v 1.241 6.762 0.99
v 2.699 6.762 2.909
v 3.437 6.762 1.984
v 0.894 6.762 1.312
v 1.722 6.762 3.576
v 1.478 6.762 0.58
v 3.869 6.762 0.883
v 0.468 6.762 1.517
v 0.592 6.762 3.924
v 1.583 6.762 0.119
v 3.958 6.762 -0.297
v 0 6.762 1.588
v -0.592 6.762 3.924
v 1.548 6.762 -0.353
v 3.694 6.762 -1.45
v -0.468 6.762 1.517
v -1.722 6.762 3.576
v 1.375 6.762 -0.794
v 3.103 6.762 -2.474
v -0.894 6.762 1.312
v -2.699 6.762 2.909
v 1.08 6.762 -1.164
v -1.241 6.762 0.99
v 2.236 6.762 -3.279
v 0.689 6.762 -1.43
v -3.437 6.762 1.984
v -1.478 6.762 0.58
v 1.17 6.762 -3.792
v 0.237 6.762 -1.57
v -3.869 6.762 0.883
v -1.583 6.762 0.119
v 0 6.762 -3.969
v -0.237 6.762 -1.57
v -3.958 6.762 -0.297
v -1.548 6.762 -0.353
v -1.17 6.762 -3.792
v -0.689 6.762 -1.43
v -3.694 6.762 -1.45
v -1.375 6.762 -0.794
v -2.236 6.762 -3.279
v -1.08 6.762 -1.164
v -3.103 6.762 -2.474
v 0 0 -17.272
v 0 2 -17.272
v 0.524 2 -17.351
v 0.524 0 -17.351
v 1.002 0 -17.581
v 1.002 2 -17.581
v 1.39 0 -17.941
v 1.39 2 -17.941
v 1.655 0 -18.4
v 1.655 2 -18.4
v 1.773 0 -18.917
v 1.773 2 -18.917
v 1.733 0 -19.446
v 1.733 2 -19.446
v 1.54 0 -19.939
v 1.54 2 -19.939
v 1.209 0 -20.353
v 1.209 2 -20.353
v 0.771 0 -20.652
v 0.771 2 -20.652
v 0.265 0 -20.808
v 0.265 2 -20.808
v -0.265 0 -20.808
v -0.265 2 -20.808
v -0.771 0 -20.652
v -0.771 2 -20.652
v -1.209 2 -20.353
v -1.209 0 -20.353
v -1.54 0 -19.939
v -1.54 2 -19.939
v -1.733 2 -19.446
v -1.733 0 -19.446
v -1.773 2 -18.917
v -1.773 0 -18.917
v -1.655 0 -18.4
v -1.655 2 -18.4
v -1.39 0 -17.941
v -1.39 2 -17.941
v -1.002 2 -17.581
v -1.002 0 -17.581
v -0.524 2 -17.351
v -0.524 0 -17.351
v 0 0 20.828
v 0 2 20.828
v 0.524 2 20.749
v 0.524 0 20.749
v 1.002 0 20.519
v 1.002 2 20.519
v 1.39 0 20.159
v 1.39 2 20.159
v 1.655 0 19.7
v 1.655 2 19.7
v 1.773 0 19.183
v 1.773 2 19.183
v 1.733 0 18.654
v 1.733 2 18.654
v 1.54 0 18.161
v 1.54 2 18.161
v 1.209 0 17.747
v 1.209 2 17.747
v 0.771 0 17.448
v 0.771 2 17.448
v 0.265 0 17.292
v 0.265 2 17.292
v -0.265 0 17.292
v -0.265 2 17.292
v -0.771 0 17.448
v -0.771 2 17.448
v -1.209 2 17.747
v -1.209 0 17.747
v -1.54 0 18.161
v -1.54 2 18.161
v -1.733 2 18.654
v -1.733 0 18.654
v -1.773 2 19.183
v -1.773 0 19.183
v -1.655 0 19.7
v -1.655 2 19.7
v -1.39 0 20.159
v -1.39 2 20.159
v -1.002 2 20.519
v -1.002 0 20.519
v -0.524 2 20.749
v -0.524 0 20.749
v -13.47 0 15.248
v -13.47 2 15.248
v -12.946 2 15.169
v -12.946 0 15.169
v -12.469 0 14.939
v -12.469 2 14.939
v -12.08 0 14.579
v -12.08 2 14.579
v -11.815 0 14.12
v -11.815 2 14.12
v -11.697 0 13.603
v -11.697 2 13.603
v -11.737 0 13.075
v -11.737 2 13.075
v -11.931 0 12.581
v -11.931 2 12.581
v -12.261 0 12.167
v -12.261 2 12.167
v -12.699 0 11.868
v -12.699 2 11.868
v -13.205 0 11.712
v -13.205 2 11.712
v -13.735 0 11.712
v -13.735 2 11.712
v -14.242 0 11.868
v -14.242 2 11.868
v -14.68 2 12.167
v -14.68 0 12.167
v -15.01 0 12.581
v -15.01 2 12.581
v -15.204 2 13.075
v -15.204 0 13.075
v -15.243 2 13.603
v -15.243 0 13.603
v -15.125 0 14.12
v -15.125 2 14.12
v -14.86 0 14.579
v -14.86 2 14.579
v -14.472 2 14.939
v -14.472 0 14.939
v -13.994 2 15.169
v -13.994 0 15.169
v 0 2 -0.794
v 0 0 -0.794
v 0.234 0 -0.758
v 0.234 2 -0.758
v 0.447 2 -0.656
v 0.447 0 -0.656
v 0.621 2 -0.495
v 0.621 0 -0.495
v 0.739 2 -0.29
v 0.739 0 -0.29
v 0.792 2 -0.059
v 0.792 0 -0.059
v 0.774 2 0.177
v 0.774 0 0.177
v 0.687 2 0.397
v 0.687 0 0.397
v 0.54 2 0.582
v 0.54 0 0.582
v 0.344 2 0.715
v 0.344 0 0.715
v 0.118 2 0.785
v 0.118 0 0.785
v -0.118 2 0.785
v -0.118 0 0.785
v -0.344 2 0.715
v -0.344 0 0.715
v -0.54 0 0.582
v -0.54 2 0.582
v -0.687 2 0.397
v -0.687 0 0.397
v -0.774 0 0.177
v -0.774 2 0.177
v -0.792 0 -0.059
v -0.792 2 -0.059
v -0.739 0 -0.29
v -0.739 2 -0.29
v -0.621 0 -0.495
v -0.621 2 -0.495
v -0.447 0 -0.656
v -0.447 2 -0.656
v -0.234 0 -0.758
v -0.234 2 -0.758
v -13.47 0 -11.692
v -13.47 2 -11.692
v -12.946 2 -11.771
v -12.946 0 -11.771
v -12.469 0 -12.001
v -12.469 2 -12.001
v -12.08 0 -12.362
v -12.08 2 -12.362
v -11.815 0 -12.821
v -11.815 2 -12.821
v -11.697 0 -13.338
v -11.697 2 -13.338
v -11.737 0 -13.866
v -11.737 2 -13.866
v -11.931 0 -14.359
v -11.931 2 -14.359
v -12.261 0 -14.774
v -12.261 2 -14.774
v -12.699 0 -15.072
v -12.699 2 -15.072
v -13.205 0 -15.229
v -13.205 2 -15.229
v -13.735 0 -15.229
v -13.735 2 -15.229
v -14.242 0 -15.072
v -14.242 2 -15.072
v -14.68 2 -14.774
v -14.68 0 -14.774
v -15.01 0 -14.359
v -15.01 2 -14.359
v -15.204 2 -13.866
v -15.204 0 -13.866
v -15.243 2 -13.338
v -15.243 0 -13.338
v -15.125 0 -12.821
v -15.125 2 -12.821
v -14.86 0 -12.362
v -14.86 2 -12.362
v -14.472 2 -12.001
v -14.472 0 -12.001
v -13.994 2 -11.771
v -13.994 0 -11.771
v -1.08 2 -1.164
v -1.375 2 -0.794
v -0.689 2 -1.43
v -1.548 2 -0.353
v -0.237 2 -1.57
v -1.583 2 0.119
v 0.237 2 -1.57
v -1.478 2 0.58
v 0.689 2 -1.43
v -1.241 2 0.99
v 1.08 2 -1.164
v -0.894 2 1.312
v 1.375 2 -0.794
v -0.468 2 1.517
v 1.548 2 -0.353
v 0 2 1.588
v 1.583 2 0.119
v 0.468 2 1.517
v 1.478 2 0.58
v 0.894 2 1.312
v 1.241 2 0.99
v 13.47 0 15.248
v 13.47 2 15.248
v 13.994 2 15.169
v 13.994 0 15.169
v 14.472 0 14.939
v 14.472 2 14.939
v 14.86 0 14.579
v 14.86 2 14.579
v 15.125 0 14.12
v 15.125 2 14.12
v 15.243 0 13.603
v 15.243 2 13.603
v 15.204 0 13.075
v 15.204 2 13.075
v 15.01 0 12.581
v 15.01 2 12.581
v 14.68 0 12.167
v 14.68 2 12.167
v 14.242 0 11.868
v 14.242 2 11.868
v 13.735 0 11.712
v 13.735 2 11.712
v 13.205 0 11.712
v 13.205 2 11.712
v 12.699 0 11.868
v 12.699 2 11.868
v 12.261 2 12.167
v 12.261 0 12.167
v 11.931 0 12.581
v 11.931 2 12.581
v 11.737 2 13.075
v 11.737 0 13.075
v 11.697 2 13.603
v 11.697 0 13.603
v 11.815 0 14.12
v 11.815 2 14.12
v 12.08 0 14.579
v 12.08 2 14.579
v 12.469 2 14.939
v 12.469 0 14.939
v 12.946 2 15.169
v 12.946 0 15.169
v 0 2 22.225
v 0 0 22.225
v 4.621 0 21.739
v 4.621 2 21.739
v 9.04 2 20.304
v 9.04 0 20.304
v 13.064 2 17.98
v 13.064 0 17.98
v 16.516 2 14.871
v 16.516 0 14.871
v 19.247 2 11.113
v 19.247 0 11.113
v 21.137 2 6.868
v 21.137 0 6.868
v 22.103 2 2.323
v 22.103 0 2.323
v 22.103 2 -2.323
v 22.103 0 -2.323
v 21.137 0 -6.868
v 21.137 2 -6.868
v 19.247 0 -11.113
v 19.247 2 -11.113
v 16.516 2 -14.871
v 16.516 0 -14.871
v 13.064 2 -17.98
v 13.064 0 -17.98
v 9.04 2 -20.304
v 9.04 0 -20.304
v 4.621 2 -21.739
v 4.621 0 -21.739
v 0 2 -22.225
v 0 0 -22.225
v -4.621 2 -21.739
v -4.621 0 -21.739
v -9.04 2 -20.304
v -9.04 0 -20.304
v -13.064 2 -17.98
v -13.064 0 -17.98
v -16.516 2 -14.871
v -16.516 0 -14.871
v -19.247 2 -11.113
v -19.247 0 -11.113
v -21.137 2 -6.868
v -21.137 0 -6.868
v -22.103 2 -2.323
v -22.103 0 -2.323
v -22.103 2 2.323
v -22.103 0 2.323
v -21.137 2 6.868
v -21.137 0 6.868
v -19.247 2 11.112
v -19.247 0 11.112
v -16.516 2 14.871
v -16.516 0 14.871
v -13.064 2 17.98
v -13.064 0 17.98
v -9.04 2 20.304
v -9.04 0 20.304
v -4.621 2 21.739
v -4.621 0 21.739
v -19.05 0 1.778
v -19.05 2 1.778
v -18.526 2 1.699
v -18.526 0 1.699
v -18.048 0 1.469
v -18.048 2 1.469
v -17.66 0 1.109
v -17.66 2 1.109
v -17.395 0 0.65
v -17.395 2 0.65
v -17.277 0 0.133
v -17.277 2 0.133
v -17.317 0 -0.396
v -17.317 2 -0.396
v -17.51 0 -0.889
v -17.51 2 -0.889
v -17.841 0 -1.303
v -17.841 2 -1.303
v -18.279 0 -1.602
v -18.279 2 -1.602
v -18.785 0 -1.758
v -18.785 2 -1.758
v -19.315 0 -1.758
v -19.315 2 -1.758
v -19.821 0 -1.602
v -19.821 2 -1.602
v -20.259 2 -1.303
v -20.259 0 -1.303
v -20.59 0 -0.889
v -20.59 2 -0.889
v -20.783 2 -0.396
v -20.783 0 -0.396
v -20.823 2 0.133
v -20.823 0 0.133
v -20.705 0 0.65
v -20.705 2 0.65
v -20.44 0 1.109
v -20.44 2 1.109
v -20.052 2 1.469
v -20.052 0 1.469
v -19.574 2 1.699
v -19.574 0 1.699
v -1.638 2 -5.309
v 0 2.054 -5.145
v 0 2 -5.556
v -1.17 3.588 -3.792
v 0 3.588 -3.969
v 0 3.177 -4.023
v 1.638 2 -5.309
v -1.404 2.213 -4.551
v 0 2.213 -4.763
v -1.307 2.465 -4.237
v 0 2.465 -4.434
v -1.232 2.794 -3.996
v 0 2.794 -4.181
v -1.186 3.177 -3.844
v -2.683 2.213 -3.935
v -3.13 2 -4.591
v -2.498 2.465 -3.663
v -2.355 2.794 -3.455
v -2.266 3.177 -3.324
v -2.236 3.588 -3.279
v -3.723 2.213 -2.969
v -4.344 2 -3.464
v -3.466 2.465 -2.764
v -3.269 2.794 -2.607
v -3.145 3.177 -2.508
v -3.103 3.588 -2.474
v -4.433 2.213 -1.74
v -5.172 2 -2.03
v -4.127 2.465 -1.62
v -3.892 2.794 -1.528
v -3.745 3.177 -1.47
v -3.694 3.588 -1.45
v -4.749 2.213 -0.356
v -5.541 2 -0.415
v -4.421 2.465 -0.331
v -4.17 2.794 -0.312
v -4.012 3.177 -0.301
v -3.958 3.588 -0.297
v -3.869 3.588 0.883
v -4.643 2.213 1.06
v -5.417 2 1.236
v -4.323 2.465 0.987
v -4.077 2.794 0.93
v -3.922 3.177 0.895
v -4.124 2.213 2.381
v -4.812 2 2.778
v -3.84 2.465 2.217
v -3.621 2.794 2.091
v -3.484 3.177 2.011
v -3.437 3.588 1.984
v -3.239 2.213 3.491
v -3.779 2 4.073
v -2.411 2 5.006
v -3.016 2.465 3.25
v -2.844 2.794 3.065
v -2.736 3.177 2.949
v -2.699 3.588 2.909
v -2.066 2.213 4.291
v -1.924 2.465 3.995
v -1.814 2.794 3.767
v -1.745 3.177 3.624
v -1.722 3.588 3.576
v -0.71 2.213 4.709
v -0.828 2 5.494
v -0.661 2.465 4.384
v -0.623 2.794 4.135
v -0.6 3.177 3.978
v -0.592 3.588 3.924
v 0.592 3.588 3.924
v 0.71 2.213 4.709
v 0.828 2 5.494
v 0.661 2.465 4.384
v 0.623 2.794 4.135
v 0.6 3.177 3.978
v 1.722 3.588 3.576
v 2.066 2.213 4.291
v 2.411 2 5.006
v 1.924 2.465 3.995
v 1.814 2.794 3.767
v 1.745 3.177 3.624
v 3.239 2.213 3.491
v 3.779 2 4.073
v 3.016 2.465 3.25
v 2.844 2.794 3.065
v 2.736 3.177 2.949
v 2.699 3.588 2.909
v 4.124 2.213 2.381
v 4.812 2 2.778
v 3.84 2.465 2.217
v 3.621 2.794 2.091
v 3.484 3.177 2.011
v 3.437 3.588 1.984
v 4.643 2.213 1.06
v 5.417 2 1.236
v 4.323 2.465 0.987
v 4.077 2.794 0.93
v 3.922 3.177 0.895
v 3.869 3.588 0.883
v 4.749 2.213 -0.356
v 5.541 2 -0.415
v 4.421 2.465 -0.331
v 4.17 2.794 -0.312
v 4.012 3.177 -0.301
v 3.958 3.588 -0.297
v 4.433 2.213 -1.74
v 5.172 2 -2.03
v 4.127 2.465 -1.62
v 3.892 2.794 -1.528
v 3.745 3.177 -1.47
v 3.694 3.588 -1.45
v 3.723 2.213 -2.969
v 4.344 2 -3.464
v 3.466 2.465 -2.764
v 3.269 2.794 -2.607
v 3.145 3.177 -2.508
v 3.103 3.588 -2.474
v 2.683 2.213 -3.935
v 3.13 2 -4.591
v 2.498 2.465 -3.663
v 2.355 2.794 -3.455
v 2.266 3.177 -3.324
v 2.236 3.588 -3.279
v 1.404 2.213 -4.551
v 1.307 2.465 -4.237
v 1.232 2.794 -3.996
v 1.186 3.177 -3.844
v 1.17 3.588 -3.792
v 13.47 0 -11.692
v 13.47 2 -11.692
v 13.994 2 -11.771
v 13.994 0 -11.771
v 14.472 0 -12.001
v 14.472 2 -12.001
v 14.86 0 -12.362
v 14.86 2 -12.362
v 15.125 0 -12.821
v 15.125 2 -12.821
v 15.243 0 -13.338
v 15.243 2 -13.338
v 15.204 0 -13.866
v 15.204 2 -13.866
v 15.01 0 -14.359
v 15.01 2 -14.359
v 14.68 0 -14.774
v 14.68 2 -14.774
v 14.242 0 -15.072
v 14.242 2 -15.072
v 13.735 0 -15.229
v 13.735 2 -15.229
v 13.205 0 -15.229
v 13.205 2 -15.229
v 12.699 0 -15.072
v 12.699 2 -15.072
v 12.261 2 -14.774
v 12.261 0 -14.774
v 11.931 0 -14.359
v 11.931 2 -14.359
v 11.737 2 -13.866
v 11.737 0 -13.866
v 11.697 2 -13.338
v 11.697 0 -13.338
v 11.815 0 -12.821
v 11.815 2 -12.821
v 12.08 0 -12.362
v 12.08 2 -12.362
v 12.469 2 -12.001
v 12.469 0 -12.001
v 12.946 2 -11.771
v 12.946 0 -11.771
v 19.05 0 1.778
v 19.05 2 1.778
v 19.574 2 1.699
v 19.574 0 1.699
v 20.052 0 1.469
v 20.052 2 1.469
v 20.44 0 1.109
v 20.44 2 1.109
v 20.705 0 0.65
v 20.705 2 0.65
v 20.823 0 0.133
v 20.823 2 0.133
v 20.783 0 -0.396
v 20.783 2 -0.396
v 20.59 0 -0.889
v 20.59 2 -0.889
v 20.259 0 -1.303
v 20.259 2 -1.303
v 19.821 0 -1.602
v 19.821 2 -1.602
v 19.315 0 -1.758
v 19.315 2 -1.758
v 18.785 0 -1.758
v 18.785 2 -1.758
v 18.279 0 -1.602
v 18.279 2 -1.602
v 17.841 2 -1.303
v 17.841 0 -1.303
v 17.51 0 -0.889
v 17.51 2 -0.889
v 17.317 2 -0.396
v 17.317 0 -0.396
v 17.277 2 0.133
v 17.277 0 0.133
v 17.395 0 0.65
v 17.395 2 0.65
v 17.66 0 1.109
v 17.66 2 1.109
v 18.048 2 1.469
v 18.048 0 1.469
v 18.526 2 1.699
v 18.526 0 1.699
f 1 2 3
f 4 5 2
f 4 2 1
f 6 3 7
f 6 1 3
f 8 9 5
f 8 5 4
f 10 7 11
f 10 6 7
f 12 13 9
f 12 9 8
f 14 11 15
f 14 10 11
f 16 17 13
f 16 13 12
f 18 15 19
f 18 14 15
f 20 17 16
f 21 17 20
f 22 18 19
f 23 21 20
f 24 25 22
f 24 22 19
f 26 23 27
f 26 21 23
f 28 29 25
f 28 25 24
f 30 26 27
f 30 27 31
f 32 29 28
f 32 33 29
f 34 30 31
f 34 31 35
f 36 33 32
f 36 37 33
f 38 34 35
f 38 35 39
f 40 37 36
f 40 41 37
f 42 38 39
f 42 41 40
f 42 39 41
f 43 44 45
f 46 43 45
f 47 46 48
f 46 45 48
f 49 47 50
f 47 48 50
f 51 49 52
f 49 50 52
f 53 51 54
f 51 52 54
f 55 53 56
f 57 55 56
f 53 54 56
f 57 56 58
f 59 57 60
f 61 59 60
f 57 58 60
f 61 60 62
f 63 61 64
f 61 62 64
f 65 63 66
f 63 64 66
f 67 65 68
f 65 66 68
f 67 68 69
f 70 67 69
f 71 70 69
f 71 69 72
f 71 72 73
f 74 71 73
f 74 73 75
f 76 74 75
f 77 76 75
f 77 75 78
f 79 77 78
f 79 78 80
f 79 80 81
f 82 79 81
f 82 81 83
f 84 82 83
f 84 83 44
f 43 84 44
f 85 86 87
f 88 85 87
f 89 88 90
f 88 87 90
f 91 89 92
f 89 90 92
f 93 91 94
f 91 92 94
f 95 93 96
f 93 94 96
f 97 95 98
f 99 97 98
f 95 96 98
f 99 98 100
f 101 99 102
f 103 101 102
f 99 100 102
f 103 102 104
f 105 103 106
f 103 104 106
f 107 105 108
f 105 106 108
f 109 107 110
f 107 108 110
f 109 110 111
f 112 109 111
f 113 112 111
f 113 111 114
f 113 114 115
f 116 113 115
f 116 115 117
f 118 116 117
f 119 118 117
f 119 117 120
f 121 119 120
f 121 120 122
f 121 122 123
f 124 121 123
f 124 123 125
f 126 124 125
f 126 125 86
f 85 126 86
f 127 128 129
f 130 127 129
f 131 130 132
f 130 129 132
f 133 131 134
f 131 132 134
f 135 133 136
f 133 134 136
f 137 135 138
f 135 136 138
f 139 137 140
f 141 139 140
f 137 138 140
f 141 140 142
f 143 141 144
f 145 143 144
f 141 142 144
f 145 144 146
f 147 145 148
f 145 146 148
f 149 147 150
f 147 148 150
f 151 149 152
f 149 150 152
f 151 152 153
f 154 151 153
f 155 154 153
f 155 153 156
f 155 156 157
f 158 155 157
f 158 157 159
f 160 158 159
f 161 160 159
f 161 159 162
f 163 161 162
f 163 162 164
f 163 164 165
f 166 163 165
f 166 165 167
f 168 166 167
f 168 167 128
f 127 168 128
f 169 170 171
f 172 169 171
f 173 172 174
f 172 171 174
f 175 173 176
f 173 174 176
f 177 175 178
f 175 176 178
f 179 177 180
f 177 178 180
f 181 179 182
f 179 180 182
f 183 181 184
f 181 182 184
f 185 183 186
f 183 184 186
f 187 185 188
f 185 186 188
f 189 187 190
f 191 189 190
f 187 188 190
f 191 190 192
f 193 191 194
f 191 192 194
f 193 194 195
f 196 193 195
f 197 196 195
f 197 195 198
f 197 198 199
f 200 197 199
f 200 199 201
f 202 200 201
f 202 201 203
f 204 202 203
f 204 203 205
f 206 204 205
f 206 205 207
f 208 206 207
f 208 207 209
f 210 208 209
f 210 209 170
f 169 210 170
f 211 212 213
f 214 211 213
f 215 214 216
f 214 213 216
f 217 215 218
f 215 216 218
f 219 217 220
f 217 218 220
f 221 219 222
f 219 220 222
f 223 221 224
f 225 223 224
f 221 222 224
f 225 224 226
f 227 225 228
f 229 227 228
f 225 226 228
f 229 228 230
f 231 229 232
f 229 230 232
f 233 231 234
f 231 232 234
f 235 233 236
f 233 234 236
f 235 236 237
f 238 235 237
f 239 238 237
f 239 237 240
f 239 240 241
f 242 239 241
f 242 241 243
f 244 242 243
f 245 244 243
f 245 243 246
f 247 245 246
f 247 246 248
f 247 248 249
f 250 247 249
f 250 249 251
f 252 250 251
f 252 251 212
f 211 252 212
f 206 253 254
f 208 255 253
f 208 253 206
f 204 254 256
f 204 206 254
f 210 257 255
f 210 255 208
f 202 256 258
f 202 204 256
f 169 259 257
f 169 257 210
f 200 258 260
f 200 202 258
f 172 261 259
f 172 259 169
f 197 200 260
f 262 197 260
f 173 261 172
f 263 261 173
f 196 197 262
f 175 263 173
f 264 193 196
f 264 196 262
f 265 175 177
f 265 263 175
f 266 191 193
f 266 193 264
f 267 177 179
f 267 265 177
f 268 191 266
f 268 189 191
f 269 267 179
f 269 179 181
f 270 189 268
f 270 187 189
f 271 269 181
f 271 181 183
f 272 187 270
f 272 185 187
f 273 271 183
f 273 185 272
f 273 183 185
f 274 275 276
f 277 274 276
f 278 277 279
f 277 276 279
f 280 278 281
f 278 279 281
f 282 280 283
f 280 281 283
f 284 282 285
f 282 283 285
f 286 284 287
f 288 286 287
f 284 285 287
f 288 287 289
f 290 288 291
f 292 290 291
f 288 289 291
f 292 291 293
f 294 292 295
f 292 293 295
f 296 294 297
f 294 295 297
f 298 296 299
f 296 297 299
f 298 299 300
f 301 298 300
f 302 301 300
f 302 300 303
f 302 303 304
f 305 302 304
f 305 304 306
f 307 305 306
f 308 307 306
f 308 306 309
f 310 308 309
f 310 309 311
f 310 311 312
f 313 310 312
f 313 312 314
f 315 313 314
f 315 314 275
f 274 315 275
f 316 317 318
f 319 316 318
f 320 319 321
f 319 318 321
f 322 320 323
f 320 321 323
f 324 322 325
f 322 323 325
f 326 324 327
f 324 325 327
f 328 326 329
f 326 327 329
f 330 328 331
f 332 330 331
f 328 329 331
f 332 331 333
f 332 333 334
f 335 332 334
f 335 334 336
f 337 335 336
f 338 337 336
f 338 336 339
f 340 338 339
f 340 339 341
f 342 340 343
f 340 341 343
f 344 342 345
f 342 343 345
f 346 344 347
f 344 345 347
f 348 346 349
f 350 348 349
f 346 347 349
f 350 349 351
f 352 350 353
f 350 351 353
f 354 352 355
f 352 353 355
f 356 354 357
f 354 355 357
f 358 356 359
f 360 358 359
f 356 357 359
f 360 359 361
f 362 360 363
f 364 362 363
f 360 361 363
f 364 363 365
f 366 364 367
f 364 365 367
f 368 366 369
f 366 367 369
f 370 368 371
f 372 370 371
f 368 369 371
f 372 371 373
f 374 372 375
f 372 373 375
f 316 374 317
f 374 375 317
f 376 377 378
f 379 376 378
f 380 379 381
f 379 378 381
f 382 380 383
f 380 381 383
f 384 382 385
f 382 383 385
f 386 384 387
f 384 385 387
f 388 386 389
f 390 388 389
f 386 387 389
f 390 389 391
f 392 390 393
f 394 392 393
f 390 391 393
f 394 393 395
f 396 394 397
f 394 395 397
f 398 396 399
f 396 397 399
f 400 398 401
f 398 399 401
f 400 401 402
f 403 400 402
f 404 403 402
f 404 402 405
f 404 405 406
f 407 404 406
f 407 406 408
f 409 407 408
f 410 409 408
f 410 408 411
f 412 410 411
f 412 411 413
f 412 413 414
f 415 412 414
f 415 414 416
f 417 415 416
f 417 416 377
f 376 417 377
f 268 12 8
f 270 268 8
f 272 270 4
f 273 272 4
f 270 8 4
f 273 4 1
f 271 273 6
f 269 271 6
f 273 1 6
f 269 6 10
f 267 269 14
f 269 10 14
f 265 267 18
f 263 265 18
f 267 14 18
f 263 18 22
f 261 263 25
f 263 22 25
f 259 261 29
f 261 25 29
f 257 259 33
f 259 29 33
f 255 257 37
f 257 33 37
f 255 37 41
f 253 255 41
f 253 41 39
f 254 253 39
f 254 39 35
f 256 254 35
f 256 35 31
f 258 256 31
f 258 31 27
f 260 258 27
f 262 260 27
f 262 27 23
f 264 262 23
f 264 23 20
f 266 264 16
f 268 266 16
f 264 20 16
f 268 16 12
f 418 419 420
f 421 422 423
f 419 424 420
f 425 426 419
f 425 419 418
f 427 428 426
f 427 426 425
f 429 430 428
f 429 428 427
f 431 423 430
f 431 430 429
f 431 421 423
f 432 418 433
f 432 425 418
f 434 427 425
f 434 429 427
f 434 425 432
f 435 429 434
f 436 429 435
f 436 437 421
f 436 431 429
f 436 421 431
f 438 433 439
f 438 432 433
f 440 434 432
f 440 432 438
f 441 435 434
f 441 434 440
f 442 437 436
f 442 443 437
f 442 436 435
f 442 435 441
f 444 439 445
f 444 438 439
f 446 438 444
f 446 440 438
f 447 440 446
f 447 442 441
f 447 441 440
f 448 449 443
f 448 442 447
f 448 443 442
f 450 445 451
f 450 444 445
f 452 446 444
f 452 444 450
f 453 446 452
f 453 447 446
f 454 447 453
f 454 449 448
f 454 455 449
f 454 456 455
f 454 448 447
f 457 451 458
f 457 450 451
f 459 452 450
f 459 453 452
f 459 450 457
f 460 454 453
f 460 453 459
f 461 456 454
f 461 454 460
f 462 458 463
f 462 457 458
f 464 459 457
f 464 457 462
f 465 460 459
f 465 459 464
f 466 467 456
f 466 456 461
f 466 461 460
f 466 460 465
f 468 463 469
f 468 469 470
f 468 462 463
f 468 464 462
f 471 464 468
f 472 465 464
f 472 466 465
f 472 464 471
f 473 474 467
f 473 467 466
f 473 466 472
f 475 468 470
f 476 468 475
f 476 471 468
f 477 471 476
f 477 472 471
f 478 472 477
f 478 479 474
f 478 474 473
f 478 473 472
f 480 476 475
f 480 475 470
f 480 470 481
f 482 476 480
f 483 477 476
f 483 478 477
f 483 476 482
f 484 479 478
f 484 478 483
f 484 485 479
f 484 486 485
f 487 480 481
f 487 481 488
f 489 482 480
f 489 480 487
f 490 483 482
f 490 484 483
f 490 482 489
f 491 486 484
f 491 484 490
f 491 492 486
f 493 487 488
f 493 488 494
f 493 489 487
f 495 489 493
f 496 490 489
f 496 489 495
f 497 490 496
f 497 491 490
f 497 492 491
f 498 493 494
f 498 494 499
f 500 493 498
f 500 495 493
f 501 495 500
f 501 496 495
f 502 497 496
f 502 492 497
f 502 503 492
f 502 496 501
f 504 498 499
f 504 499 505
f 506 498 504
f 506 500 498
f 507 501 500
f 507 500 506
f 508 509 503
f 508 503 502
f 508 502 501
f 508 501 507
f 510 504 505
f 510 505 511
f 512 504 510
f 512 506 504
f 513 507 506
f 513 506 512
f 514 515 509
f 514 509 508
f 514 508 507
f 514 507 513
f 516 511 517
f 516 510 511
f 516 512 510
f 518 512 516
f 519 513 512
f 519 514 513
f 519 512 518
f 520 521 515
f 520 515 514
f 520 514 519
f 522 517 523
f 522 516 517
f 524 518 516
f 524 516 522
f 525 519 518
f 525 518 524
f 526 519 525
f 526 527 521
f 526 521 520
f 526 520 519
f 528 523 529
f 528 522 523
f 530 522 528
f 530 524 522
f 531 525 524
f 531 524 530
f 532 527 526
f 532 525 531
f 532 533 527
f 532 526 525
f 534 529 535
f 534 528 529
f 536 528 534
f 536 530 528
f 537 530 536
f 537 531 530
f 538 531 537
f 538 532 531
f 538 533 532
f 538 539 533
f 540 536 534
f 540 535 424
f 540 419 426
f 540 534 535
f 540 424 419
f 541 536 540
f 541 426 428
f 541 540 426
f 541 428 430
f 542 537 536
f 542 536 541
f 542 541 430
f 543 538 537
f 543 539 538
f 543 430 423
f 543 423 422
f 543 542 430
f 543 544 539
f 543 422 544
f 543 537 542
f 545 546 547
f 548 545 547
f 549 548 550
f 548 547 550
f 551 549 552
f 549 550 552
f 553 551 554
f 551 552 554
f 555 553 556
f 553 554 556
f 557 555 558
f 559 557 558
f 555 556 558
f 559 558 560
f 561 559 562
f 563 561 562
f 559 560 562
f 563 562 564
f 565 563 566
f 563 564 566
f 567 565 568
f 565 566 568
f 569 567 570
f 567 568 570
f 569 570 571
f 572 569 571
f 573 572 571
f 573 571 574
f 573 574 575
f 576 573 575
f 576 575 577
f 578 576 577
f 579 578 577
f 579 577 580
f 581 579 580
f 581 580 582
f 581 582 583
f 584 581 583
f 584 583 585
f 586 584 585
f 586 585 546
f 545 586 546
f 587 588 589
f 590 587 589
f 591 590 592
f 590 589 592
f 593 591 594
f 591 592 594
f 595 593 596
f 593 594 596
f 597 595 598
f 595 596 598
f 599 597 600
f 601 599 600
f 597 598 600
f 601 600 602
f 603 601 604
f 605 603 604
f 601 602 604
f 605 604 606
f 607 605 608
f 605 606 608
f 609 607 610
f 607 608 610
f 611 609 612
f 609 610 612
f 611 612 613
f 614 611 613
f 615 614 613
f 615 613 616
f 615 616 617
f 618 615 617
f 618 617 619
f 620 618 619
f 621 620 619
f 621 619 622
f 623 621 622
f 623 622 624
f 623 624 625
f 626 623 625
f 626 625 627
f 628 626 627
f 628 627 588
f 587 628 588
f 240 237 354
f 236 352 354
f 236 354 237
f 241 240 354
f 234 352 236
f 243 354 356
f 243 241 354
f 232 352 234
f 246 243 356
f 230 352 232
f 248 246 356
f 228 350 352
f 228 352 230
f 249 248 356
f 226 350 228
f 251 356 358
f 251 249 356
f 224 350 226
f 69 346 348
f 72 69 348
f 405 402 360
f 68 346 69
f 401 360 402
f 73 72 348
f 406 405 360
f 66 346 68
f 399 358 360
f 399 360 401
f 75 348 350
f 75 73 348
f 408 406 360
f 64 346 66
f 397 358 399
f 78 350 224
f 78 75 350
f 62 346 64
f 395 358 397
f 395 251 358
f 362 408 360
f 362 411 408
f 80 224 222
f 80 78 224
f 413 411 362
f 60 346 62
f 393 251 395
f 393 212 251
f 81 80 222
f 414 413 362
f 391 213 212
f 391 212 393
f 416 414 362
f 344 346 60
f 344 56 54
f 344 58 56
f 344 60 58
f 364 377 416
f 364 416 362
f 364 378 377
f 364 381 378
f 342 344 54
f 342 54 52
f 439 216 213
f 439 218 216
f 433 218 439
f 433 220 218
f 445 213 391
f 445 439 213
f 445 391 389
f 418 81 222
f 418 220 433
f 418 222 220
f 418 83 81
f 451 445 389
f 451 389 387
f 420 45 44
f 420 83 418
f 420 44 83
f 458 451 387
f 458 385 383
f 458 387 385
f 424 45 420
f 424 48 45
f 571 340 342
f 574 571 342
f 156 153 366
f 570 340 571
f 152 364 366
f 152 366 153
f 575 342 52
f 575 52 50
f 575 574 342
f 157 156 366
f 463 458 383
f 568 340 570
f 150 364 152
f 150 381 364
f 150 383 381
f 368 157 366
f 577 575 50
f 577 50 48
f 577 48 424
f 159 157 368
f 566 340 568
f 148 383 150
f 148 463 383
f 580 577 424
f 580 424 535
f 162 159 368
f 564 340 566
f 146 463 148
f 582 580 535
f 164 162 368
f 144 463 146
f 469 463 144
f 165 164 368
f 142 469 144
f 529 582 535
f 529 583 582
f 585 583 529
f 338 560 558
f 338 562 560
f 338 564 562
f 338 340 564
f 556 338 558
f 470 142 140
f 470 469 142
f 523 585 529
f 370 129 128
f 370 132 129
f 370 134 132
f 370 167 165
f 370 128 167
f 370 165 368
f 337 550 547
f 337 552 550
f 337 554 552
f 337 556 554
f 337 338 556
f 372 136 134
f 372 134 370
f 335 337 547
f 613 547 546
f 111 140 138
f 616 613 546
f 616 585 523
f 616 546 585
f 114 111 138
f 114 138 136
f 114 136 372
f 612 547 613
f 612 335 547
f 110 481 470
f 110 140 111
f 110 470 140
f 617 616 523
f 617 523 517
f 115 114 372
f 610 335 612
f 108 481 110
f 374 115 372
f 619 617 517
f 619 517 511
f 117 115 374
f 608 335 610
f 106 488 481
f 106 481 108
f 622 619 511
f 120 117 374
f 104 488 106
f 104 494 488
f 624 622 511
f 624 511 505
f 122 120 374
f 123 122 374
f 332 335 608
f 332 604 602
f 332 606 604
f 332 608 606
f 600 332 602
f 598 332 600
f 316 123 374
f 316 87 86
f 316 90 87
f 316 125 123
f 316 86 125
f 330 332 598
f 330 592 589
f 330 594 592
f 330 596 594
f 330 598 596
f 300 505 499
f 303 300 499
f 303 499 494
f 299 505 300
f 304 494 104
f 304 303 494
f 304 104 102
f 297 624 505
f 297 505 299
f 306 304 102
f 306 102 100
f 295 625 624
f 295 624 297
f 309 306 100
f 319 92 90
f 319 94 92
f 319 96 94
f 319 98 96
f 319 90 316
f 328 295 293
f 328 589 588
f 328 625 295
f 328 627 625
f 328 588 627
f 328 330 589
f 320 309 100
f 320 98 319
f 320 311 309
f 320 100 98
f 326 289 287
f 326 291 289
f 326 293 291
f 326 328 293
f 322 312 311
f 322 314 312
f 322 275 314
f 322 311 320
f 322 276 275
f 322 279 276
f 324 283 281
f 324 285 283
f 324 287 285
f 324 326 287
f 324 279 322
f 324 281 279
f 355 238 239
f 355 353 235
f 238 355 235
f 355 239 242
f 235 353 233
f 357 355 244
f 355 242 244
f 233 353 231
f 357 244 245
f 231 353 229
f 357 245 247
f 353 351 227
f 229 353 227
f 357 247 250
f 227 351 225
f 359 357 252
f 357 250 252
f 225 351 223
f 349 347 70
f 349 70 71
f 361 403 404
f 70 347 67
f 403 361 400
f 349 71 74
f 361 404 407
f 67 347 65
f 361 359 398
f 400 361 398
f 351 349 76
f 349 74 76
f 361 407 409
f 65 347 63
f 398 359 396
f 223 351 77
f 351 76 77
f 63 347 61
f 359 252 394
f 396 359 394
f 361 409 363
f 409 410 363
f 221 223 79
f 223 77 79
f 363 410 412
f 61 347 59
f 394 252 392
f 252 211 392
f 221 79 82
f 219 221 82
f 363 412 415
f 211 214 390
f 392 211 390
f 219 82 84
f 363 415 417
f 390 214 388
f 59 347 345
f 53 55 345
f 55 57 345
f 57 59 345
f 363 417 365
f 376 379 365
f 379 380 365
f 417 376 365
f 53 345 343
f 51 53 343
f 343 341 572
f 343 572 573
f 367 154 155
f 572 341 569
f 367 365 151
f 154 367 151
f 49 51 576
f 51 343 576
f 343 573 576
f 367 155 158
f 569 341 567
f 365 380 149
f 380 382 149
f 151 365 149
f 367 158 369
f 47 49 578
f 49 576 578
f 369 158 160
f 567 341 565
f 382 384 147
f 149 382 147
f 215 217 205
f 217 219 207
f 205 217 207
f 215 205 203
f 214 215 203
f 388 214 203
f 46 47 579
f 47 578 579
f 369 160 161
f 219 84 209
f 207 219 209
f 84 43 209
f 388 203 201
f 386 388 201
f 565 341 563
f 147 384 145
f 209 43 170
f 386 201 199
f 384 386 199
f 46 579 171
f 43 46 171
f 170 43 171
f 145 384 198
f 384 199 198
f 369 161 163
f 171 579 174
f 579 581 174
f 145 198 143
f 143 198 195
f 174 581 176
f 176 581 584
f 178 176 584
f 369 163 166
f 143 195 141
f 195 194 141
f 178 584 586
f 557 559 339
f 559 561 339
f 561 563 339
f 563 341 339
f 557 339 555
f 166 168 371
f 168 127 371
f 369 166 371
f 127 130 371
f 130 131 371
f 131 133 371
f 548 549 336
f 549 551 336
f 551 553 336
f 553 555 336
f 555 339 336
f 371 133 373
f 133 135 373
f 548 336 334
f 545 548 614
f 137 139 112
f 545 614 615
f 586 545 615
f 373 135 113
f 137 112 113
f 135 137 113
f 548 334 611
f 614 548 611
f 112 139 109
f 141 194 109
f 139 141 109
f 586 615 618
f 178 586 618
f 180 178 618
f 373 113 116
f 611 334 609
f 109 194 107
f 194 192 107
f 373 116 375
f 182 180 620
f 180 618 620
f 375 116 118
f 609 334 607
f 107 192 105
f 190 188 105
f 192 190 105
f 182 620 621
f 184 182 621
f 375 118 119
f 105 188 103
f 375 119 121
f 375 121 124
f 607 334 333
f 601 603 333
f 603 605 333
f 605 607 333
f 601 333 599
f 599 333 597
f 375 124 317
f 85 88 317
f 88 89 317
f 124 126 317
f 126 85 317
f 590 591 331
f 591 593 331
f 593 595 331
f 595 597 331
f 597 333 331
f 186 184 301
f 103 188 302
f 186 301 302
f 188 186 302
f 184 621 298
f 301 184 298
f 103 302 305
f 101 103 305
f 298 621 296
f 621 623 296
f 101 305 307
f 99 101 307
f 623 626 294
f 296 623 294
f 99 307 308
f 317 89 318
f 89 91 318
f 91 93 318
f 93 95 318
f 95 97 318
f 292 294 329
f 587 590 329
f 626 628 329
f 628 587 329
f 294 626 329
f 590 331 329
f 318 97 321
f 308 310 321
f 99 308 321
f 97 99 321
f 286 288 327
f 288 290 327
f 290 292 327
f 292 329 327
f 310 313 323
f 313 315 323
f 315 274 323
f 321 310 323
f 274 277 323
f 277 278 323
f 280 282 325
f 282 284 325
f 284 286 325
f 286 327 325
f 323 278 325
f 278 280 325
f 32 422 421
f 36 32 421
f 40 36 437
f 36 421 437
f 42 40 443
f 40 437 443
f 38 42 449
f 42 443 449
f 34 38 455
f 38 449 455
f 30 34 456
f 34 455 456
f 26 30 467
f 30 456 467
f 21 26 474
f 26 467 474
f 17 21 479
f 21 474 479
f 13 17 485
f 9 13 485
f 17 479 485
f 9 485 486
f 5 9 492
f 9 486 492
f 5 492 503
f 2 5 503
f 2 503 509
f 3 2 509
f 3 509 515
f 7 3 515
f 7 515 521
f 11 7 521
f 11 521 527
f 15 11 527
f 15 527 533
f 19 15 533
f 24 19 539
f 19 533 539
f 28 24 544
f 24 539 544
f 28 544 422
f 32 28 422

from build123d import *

# Parameters (mm, degrees)
SKETCH1_R           = 22.225
BOSS_EXTRUDE1_DEPTH = 2
SKETCH2_R           = 1.778
CUT_EXTRUDE1_DEPTH  = 32.494463799
SKETCH3_R           = 3.96875
BOSS_EXTRUDE2_DEPTH = 4.7625
SKETCH4_R           = 1.5875
CUT_EXTRUDE2_DEPTH  = 4.7625
FILLET1_R           = 1.5875
SKETCH5_R           = 0.79375
CUT_EXTRUDE6_DEPTH  = 2.54


with BuildPart() as part:
    # Sketch1 → Boss-Extrude1 (new body)
    with BuildSketch(Plane(origin=(0, 0, 0), x_dir=(1, 0, 0), z_dir=(0, 1, 0))):
        with Locations(Location((0, 0, 0), (0, 0, 270))):
            Circle(SKETCH1_R)
    extrude(amount=BOSS_EXTRUDE1_DEPTH)

    # Sketch2 → Cut-Extrude1 (cut, through all)
    with BuildSketch(Plane(origin=(0, 2, 0), x_dir=(1, 0, 0), z_dir=(0, 1, 0))):
        with Locations(Location((0, 19.05, 0), (0, 0, 270))):
            Circle(SKETCH2_R)
        with Locations(Location((13.470384182, 13.470384182, 0), (0, 0, 270))):
            Circle(SKETCH2_R)
        with Locations(Location((19.05, 0, 0), (0, 0, 270))):
            Circle(SKETCH2_R)
        with Locations(Location((13.470384182, -13.470384182, 0), (0, 0, 270))):
            Circle(SKETCH2_R)
        with Locations(Location((0, -19.05, 0), (0, 0, 270))):
            Circle(SKETCH2_R)
        with Locations(Location((-13.470384182, -13.470384182, 0), (0, 0, 270))):
            Circle(SKETCH2_R)
        with Locations(Location((-19.05, 0, 0), (0, 0, 270))):
            Circle(SKETCH2_R)
        with Locations(Location((-13.470384182, 13.470384182, 0), (0, 0, 270))):
            Circle(SKETCH2_R)
    extrude(amount=-CUT_EXTRUDE1_DEPTH, mode=Mode.SUBTRACT)

    # Sketch3 → Boss-Extrude2 (add)
    with BuildSketch(Plane(origin=(0, 2, 0), x_dir=(1, 0, 0), z_dir=(0, 1, 0))):
        with Locations(Location((0, 0, 0), (0, 0, 90))):
            Circle(SKETCH3_R)
    extrude(amount=BOSS_EXTRUDE2_DEPTH)

    # Sketch4 → Cut-Extrude2 (cut)
    with BuildSketch(Plane(origin=(0, 6.7625, 0), x_dir=(1, 0, 0), z_dir=(0, 1, 0))):
        with Locations(Location((0, 0, 0), (0, 0, 270))):
            Circle(SKETCH4_R)
    extrude(amount=-CUT_EXTRUDE2_DEPTH, mode=Mode.SUBTRACT)

    # Fillet1
    fillet1_edges = [part.edges().sort_by_distance(p)[0] for p in [
        (0, 2, 3.96875),
    ]]
    fillet(fillet1_edges, radius=FILLET1_R)

    # Sketch5 → Cut-Extrude6 (cut)
    with BuildSketch(Plane(origin=(0, 0, 0), x_dir=(-1, 0, 0), z_dir=(0, -1, 0))):
        with Locations(Location((0, 0, 0), (0, 0, 90))):
            Circle(SKETCH5_R)
    extrude(amount=-CUT_EXTRUDE6_DEPTH, mode=Mode.SUBTRACT)


solid = part.part
